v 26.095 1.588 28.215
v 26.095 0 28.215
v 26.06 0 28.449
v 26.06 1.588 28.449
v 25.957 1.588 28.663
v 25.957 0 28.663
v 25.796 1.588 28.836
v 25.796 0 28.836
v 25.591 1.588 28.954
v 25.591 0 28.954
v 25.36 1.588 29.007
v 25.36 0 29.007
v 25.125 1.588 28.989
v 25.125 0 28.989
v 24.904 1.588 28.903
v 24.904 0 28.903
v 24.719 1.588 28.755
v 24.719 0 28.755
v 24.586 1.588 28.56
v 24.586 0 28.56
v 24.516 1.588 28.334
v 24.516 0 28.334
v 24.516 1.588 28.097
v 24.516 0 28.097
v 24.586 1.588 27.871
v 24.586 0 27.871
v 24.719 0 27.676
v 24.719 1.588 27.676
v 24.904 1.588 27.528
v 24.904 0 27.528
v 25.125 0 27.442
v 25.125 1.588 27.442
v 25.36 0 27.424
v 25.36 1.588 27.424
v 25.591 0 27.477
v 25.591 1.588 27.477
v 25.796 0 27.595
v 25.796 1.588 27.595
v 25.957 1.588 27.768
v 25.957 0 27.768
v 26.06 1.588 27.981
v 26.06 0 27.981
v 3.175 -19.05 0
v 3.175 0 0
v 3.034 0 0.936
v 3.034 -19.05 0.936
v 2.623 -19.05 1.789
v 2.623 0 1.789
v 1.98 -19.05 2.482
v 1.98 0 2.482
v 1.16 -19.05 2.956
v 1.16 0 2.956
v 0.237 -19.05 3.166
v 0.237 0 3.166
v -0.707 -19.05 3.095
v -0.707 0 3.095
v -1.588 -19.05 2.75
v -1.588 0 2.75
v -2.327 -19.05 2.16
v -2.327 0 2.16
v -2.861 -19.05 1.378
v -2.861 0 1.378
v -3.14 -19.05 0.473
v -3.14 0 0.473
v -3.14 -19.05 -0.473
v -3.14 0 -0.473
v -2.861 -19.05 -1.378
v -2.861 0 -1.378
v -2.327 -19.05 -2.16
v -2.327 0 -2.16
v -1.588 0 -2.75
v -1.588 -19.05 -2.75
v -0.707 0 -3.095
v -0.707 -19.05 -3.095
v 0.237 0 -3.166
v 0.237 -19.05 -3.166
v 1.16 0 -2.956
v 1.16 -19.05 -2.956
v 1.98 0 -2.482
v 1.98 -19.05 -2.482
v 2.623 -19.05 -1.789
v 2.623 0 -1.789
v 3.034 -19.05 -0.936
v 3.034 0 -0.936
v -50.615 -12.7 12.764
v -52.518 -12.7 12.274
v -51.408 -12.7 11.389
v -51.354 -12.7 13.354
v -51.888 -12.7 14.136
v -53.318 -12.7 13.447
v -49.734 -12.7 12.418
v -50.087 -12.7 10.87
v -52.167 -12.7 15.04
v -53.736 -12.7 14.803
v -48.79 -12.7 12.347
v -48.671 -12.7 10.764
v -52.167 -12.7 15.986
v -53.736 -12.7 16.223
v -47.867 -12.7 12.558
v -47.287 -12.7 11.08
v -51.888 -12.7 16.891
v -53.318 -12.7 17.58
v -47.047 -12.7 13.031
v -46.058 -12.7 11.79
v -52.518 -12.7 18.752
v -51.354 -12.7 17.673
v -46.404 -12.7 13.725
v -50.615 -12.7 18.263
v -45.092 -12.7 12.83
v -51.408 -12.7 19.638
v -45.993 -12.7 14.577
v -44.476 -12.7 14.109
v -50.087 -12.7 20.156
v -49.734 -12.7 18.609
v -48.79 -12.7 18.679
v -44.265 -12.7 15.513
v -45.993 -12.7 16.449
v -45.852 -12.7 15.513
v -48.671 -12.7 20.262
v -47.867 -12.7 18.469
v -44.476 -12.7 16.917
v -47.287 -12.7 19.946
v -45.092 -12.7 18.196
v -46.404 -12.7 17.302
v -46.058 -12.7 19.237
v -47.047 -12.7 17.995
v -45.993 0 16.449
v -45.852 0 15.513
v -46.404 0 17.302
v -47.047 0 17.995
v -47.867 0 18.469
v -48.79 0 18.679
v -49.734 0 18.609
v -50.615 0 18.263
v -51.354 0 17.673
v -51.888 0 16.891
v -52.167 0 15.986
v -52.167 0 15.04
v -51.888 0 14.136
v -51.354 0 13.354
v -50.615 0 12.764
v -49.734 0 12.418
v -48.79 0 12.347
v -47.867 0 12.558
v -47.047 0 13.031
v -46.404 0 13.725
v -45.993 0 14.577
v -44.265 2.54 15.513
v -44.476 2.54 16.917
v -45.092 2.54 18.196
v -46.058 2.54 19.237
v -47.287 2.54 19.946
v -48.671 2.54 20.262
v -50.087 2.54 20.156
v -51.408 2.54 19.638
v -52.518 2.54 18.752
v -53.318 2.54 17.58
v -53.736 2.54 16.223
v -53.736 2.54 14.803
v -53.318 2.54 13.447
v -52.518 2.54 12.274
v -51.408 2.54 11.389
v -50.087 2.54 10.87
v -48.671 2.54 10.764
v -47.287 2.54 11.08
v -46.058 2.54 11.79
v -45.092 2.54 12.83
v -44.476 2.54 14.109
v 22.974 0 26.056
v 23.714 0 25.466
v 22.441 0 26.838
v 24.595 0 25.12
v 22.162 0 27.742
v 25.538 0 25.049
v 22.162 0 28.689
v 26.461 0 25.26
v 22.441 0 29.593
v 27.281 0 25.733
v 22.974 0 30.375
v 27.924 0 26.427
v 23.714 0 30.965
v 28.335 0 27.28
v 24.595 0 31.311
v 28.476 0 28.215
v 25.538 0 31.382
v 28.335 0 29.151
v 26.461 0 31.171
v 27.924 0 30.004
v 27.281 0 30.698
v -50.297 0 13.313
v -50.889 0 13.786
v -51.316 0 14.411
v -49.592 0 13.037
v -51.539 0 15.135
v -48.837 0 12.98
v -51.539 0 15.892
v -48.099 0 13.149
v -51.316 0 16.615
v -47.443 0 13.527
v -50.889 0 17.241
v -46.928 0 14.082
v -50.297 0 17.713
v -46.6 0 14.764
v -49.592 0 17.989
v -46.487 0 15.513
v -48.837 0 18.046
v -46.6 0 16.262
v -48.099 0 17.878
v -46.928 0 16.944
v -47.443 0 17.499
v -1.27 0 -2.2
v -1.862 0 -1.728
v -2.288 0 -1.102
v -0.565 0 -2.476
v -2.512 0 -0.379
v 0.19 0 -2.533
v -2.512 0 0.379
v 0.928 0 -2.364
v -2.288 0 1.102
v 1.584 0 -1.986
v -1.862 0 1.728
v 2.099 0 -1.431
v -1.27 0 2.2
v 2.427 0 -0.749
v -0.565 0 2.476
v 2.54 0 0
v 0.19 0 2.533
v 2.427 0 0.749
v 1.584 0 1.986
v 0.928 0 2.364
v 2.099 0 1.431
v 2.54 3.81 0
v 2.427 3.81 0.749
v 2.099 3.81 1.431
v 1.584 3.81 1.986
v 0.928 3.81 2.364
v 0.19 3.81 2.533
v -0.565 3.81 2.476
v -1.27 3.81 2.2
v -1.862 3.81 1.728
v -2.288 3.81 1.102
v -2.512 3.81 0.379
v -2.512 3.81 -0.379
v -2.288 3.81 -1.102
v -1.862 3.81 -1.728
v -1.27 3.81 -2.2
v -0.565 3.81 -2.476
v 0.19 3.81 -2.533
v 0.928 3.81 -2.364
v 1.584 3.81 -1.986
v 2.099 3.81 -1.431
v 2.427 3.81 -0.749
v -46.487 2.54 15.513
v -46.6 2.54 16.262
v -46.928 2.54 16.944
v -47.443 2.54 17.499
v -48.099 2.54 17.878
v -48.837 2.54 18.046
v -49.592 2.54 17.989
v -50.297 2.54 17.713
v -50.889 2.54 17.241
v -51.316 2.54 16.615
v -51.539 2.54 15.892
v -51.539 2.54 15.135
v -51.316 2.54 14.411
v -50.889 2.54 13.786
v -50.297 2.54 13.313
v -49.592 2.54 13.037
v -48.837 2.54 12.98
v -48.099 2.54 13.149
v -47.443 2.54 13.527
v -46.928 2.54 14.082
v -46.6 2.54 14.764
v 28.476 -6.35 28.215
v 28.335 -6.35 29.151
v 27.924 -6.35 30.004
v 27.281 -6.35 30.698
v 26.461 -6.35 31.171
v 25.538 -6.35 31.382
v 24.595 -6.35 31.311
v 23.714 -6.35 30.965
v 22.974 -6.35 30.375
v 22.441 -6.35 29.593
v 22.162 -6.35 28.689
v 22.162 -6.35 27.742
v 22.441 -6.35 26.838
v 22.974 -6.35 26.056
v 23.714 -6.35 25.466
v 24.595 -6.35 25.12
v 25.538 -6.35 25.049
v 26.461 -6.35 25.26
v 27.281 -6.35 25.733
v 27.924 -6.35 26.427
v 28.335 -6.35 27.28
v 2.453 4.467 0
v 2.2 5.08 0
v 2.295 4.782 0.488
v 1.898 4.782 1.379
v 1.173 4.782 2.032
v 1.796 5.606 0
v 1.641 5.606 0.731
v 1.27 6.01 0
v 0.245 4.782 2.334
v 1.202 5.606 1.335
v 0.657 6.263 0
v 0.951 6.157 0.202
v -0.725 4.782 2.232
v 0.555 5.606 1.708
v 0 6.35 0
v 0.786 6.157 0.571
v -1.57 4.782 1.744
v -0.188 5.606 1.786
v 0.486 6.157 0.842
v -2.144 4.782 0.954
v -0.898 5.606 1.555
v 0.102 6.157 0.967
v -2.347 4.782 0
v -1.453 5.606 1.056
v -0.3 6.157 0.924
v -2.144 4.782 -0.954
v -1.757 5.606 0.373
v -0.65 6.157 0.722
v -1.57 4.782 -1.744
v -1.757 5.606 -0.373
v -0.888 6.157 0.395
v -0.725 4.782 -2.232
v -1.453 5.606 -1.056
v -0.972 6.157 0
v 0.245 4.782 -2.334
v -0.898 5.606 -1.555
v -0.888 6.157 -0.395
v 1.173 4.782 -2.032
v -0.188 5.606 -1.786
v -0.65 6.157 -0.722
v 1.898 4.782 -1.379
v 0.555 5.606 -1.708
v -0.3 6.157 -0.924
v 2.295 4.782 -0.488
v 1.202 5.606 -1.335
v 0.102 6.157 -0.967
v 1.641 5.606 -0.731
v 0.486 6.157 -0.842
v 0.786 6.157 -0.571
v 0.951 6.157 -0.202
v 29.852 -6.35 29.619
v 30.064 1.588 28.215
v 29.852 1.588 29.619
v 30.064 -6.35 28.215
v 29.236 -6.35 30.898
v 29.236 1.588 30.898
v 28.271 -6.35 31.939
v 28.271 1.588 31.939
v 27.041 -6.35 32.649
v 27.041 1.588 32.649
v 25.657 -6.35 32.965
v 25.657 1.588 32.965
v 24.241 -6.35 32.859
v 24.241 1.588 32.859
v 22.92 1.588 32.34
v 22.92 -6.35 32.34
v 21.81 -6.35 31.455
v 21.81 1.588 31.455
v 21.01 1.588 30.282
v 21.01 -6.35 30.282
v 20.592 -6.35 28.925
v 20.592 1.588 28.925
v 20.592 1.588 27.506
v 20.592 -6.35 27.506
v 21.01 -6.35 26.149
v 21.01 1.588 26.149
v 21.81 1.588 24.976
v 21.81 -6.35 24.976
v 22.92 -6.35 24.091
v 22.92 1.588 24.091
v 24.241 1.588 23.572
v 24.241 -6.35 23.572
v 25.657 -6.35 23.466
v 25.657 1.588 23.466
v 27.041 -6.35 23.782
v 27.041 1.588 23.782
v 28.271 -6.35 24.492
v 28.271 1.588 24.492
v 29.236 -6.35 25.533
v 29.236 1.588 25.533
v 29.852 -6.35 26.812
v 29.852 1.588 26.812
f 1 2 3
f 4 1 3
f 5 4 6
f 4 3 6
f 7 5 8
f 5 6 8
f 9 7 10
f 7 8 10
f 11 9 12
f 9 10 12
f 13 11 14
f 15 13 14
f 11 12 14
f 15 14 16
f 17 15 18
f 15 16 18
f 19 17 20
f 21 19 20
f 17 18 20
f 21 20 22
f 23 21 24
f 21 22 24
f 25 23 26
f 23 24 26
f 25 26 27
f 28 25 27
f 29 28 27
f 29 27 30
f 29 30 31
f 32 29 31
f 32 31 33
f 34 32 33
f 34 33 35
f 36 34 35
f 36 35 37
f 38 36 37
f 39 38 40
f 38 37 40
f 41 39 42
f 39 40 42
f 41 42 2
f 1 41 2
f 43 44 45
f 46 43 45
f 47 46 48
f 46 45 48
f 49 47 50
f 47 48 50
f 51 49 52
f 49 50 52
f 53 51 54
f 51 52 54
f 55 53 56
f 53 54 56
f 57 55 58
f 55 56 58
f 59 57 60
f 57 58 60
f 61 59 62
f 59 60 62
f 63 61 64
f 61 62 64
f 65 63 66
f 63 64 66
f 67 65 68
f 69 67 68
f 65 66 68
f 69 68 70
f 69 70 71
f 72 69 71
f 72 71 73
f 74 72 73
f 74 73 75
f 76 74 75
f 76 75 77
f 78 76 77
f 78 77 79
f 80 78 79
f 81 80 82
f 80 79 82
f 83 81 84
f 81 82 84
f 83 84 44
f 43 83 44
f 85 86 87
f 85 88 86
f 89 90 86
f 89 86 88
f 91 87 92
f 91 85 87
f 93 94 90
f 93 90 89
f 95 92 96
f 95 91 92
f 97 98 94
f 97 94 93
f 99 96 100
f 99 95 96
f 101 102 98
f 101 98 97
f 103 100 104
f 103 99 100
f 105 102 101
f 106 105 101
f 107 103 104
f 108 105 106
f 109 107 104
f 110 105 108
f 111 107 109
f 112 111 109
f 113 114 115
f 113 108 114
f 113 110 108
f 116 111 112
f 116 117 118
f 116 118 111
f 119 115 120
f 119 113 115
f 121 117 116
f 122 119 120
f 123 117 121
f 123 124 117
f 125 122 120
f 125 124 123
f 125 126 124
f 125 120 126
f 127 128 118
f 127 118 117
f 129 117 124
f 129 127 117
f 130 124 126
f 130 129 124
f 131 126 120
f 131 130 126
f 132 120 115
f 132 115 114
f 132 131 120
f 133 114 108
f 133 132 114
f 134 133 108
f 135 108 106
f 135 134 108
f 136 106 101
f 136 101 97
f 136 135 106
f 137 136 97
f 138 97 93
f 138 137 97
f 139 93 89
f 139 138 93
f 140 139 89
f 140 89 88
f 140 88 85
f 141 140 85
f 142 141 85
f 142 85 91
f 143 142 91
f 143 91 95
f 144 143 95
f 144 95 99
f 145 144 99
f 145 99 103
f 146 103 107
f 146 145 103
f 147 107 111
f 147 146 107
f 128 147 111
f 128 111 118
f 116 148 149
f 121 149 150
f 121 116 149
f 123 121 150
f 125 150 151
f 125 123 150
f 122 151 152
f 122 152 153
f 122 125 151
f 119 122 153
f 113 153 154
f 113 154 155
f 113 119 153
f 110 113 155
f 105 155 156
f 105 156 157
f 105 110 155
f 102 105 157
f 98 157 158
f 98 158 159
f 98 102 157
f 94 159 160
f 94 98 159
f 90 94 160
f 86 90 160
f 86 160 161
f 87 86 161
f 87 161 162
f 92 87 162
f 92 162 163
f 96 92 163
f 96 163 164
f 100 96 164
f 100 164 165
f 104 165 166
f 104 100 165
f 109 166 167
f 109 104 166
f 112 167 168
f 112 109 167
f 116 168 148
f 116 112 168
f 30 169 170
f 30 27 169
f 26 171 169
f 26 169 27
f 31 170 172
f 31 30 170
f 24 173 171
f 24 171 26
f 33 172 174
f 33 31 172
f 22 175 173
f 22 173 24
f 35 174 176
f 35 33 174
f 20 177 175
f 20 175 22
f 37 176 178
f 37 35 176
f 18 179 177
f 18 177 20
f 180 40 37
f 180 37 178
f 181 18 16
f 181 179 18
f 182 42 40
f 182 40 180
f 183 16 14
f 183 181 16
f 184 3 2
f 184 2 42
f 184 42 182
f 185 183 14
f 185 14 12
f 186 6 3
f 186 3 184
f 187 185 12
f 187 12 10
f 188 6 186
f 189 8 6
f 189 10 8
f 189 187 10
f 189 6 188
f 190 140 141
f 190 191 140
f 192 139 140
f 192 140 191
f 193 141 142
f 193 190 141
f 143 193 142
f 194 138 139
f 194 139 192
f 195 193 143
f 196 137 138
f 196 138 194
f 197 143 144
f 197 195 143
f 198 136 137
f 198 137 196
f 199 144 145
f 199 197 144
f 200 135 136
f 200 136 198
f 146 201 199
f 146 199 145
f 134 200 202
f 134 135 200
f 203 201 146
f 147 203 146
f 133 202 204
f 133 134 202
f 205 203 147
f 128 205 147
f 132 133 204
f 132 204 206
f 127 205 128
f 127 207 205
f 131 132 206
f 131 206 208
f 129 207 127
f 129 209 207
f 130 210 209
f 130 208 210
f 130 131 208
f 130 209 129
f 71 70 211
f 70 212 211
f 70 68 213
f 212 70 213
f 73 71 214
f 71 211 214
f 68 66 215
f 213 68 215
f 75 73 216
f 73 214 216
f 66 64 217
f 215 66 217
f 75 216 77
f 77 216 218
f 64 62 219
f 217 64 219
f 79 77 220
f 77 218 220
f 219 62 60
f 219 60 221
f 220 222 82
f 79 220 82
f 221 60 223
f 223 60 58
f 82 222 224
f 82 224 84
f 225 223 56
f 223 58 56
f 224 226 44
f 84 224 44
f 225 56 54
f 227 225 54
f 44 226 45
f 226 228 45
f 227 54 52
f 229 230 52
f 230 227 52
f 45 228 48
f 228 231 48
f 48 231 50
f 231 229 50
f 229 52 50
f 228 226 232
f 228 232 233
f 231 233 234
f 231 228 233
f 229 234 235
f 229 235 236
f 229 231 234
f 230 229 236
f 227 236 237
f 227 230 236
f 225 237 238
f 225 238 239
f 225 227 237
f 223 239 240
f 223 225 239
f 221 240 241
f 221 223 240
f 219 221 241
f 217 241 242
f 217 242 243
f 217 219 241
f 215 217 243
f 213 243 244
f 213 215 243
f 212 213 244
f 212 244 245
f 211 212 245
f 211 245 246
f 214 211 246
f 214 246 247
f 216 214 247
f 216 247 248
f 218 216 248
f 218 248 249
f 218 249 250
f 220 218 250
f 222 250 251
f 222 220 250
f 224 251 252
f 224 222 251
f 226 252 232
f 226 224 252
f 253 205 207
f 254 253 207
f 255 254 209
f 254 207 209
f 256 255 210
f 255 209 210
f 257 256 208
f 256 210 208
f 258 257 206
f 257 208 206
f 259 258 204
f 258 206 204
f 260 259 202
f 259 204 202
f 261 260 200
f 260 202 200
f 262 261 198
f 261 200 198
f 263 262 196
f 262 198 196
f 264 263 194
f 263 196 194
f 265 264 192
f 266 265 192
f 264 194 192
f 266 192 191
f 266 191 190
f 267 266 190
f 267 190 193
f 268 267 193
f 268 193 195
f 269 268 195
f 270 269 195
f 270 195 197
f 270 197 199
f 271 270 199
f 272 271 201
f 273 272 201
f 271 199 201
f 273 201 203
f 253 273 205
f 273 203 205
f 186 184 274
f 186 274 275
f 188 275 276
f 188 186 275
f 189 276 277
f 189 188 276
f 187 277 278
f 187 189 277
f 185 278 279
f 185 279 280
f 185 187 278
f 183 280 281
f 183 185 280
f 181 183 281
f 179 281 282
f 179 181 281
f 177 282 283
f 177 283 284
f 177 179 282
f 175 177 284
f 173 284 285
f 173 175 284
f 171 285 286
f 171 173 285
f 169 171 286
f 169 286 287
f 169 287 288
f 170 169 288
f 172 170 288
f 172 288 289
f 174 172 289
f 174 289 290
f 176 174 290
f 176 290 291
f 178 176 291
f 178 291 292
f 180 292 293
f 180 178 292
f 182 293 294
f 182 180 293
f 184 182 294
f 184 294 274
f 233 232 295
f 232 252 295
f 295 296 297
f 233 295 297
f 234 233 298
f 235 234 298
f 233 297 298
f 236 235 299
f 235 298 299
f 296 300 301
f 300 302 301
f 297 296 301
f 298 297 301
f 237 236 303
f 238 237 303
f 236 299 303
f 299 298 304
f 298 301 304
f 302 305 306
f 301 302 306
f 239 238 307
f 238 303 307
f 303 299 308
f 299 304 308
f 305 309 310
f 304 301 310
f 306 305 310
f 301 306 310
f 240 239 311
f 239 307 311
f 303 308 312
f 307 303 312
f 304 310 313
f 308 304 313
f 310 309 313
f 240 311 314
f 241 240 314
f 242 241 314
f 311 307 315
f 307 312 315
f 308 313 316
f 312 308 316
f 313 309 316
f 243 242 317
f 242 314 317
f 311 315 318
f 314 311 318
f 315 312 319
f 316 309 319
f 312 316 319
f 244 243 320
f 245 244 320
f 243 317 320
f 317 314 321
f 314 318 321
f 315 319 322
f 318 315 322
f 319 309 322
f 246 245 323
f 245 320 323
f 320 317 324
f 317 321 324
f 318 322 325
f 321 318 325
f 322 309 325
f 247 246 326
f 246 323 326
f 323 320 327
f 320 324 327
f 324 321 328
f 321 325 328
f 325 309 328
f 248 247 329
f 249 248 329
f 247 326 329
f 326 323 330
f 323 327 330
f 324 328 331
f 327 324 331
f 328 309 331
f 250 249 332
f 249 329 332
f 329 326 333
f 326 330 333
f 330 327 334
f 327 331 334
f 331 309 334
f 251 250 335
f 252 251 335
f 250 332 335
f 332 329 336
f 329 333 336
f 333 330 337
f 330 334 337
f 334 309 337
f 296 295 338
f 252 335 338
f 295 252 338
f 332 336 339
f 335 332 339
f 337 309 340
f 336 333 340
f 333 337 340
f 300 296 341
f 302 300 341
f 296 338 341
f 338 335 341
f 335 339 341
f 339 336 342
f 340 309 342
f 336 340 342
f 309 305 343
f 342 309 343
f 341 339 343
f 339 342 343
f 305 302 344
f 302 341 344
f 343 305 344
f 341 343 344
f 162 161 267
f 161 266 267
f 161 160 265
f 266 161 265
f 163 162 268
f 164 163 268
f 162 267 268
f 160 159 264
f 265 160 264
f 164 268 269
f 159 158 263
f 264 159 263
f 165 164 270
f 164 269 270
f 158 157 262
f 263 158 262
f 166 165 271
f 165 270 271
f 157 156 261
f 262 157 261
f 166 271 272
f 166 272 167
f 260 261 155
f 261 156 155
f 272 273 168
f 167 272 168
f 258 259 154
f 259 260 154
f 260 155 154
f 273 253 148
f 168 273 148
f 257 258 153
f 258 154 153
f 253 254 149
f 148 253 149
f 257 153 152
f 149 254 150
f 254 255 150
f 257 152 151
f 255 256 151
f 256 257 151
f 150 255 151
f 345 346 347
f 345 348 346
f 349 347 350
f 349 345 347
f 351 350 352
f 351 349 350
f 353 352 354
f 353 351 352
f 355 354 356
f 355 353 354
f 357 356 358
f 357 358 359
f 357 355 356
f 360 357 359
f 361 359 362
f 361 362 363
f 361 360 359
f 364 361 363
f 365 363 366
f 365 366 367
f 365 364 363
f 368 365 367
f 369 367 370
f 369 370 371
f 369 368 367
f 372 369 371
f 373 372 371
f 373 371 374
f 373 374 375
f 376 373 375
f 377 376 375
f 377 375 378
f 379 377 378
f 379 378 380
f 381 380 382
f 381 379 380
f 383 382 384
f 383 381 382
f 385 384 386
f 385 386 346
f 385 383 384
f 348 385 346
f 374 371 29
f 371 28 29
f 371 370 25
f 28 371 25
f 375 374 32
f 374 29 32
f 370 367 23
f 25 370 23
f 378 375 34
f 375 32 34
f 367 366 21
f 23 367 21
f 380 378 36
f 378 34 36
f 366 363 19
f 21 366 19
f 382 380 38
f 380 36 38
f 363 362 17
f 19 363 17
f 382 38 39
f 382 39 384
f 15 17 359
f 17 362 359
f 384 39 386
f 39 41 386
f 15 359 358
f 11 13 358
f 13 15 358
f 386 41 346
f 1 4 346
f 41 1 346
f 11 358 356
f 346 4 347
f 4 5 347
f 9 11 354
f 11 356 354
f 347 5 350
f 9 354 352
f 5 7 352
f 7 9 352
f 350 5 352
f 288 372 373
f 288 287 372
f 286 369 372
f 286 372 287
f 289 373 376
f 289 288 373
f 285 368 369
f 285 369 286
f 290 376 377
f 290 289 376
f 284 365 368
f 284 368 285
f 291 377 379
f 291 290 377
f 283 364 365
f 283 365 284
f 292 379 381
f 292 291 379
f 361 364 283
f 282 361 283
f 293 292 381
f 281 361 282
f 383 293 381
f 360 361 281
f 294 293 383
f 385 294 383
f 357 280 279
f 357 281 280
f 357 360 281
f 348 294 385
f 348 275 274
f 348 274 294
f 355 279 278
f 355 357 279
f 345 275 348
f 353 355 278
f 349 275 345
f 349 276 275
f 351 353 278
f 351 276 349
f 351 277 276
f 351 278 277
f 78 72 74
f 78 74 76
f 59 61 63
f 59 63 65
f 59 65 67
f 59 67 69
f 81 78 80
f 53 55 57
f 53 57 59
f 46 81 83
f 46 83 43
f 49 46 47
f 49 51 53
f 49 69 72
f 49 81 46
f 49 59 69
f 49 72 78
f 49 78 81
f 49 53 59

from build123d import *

# Parameters (mm, degrees)
F0_R     = 3.175
F0_R_2   = 2.54
F1_DEPTH = 19.05
F2_DEPTH = 6.35
F3_R     = 2.54
F4_R     = 4.7625
F4_R_2   = 3.175
F5_DEPTH = 12.7
F4_R_3   = 2.54
F6_DEPTH = 2.54
F7_R     = 4.7625
F7_R_2   = 3.175
F8_DEPTH = 6.35
F7_R_3   = 0.79375
F9_DEPTH = 1.5875


with BuildPart() as f1:
    # F0 (on Front) → F1 (new body)
    with BuildSketch(Plane.XZ):
        Circle(F0_R)
        Circle(F0_R_2, mode=Mode.SUBTRACT)
        Circle(F0_R_2)
    extrude(amount=F1_DEPTH)

    # F0 (on Front) → F2 (join)
    with BuildSketch(Plane.XZ):
        Circle(F0_R_2)
    extrude(amount=-F2_DEPTH)

    # F3
    f3_edges = [f1.edges().sort_by_distance(p)[0] for p in [
        (-2.54, 6.35, 0),
    ]]
    fillet(f3_edges, radius=F3_R)


with BuildPart() as f5:
    # F4 (on Front) → F5 (new body)
    with BuildSketch(Plane.XZ):
        with Locations((-49.0270517766, 15.5131686479)):
            Circle(F4_R)
        with Locations((-49.0270517766, 15.5131686479)):
            Circle(F4_R_2, mode=Mode.SUBTRACT)
    extrude(amount=F5_DEPTH)

    # F4 (on Front) → F6 (join)
    with BuildSketch(Plane.XZ):
        with Locations((-49.0270517766, 15.5131686479)):
            Circle(F4_R)
        with Locations((-49.0270517766, 15.5131686479)):
            Circle(F4_R_2, mode=Mode.SUBTRACT)
        with Locations((-49.0270517766, 15.5131686479)):
            Circle(F4_R_2)
        with Locations((-49.0270517766, 15.5131686479)):
            Circle(F4_R_3, mode=Mode.SUBTRACT)
    extrude(amount=-F6_DEPTH)


with BuildPart() as f8:
    # F7 (on Front) → F8 (new body)
    with BuildSketch(Plane.XZ):
        with Locations((25.3011770546, 28.2154474407)):
            Circle(F7_R)
        with Locations((25.3011770546, 28.2154474407)):
            Circle(F7_R_2, mode=Mode.SUBTRACT)
    extrude(amount=F8_DEPTH)

    # F7 (on Front) → F9 (join)
    with BuildSketch(Plane.XZ):
        with Locations((25.3011770546, 28.2154474407)):
            Circle(F7_R)
        with Locations((25.3011770546, 28.2154474407)):
            Circle(F7_R_2, mode=Mode.SUBTRACT)
        with Locations((25.3011770546, 28.2154474407)):
            Circle(F7_R_2)
        with Locations((25.3011770546, 28.2154474407)):
            Circle(F7_R_3, mode=Mode.SUBTRACT)
    extrude(amount=-F9_DEPTH)


solid = Compound([f1.part, f5.part, f8.part])
